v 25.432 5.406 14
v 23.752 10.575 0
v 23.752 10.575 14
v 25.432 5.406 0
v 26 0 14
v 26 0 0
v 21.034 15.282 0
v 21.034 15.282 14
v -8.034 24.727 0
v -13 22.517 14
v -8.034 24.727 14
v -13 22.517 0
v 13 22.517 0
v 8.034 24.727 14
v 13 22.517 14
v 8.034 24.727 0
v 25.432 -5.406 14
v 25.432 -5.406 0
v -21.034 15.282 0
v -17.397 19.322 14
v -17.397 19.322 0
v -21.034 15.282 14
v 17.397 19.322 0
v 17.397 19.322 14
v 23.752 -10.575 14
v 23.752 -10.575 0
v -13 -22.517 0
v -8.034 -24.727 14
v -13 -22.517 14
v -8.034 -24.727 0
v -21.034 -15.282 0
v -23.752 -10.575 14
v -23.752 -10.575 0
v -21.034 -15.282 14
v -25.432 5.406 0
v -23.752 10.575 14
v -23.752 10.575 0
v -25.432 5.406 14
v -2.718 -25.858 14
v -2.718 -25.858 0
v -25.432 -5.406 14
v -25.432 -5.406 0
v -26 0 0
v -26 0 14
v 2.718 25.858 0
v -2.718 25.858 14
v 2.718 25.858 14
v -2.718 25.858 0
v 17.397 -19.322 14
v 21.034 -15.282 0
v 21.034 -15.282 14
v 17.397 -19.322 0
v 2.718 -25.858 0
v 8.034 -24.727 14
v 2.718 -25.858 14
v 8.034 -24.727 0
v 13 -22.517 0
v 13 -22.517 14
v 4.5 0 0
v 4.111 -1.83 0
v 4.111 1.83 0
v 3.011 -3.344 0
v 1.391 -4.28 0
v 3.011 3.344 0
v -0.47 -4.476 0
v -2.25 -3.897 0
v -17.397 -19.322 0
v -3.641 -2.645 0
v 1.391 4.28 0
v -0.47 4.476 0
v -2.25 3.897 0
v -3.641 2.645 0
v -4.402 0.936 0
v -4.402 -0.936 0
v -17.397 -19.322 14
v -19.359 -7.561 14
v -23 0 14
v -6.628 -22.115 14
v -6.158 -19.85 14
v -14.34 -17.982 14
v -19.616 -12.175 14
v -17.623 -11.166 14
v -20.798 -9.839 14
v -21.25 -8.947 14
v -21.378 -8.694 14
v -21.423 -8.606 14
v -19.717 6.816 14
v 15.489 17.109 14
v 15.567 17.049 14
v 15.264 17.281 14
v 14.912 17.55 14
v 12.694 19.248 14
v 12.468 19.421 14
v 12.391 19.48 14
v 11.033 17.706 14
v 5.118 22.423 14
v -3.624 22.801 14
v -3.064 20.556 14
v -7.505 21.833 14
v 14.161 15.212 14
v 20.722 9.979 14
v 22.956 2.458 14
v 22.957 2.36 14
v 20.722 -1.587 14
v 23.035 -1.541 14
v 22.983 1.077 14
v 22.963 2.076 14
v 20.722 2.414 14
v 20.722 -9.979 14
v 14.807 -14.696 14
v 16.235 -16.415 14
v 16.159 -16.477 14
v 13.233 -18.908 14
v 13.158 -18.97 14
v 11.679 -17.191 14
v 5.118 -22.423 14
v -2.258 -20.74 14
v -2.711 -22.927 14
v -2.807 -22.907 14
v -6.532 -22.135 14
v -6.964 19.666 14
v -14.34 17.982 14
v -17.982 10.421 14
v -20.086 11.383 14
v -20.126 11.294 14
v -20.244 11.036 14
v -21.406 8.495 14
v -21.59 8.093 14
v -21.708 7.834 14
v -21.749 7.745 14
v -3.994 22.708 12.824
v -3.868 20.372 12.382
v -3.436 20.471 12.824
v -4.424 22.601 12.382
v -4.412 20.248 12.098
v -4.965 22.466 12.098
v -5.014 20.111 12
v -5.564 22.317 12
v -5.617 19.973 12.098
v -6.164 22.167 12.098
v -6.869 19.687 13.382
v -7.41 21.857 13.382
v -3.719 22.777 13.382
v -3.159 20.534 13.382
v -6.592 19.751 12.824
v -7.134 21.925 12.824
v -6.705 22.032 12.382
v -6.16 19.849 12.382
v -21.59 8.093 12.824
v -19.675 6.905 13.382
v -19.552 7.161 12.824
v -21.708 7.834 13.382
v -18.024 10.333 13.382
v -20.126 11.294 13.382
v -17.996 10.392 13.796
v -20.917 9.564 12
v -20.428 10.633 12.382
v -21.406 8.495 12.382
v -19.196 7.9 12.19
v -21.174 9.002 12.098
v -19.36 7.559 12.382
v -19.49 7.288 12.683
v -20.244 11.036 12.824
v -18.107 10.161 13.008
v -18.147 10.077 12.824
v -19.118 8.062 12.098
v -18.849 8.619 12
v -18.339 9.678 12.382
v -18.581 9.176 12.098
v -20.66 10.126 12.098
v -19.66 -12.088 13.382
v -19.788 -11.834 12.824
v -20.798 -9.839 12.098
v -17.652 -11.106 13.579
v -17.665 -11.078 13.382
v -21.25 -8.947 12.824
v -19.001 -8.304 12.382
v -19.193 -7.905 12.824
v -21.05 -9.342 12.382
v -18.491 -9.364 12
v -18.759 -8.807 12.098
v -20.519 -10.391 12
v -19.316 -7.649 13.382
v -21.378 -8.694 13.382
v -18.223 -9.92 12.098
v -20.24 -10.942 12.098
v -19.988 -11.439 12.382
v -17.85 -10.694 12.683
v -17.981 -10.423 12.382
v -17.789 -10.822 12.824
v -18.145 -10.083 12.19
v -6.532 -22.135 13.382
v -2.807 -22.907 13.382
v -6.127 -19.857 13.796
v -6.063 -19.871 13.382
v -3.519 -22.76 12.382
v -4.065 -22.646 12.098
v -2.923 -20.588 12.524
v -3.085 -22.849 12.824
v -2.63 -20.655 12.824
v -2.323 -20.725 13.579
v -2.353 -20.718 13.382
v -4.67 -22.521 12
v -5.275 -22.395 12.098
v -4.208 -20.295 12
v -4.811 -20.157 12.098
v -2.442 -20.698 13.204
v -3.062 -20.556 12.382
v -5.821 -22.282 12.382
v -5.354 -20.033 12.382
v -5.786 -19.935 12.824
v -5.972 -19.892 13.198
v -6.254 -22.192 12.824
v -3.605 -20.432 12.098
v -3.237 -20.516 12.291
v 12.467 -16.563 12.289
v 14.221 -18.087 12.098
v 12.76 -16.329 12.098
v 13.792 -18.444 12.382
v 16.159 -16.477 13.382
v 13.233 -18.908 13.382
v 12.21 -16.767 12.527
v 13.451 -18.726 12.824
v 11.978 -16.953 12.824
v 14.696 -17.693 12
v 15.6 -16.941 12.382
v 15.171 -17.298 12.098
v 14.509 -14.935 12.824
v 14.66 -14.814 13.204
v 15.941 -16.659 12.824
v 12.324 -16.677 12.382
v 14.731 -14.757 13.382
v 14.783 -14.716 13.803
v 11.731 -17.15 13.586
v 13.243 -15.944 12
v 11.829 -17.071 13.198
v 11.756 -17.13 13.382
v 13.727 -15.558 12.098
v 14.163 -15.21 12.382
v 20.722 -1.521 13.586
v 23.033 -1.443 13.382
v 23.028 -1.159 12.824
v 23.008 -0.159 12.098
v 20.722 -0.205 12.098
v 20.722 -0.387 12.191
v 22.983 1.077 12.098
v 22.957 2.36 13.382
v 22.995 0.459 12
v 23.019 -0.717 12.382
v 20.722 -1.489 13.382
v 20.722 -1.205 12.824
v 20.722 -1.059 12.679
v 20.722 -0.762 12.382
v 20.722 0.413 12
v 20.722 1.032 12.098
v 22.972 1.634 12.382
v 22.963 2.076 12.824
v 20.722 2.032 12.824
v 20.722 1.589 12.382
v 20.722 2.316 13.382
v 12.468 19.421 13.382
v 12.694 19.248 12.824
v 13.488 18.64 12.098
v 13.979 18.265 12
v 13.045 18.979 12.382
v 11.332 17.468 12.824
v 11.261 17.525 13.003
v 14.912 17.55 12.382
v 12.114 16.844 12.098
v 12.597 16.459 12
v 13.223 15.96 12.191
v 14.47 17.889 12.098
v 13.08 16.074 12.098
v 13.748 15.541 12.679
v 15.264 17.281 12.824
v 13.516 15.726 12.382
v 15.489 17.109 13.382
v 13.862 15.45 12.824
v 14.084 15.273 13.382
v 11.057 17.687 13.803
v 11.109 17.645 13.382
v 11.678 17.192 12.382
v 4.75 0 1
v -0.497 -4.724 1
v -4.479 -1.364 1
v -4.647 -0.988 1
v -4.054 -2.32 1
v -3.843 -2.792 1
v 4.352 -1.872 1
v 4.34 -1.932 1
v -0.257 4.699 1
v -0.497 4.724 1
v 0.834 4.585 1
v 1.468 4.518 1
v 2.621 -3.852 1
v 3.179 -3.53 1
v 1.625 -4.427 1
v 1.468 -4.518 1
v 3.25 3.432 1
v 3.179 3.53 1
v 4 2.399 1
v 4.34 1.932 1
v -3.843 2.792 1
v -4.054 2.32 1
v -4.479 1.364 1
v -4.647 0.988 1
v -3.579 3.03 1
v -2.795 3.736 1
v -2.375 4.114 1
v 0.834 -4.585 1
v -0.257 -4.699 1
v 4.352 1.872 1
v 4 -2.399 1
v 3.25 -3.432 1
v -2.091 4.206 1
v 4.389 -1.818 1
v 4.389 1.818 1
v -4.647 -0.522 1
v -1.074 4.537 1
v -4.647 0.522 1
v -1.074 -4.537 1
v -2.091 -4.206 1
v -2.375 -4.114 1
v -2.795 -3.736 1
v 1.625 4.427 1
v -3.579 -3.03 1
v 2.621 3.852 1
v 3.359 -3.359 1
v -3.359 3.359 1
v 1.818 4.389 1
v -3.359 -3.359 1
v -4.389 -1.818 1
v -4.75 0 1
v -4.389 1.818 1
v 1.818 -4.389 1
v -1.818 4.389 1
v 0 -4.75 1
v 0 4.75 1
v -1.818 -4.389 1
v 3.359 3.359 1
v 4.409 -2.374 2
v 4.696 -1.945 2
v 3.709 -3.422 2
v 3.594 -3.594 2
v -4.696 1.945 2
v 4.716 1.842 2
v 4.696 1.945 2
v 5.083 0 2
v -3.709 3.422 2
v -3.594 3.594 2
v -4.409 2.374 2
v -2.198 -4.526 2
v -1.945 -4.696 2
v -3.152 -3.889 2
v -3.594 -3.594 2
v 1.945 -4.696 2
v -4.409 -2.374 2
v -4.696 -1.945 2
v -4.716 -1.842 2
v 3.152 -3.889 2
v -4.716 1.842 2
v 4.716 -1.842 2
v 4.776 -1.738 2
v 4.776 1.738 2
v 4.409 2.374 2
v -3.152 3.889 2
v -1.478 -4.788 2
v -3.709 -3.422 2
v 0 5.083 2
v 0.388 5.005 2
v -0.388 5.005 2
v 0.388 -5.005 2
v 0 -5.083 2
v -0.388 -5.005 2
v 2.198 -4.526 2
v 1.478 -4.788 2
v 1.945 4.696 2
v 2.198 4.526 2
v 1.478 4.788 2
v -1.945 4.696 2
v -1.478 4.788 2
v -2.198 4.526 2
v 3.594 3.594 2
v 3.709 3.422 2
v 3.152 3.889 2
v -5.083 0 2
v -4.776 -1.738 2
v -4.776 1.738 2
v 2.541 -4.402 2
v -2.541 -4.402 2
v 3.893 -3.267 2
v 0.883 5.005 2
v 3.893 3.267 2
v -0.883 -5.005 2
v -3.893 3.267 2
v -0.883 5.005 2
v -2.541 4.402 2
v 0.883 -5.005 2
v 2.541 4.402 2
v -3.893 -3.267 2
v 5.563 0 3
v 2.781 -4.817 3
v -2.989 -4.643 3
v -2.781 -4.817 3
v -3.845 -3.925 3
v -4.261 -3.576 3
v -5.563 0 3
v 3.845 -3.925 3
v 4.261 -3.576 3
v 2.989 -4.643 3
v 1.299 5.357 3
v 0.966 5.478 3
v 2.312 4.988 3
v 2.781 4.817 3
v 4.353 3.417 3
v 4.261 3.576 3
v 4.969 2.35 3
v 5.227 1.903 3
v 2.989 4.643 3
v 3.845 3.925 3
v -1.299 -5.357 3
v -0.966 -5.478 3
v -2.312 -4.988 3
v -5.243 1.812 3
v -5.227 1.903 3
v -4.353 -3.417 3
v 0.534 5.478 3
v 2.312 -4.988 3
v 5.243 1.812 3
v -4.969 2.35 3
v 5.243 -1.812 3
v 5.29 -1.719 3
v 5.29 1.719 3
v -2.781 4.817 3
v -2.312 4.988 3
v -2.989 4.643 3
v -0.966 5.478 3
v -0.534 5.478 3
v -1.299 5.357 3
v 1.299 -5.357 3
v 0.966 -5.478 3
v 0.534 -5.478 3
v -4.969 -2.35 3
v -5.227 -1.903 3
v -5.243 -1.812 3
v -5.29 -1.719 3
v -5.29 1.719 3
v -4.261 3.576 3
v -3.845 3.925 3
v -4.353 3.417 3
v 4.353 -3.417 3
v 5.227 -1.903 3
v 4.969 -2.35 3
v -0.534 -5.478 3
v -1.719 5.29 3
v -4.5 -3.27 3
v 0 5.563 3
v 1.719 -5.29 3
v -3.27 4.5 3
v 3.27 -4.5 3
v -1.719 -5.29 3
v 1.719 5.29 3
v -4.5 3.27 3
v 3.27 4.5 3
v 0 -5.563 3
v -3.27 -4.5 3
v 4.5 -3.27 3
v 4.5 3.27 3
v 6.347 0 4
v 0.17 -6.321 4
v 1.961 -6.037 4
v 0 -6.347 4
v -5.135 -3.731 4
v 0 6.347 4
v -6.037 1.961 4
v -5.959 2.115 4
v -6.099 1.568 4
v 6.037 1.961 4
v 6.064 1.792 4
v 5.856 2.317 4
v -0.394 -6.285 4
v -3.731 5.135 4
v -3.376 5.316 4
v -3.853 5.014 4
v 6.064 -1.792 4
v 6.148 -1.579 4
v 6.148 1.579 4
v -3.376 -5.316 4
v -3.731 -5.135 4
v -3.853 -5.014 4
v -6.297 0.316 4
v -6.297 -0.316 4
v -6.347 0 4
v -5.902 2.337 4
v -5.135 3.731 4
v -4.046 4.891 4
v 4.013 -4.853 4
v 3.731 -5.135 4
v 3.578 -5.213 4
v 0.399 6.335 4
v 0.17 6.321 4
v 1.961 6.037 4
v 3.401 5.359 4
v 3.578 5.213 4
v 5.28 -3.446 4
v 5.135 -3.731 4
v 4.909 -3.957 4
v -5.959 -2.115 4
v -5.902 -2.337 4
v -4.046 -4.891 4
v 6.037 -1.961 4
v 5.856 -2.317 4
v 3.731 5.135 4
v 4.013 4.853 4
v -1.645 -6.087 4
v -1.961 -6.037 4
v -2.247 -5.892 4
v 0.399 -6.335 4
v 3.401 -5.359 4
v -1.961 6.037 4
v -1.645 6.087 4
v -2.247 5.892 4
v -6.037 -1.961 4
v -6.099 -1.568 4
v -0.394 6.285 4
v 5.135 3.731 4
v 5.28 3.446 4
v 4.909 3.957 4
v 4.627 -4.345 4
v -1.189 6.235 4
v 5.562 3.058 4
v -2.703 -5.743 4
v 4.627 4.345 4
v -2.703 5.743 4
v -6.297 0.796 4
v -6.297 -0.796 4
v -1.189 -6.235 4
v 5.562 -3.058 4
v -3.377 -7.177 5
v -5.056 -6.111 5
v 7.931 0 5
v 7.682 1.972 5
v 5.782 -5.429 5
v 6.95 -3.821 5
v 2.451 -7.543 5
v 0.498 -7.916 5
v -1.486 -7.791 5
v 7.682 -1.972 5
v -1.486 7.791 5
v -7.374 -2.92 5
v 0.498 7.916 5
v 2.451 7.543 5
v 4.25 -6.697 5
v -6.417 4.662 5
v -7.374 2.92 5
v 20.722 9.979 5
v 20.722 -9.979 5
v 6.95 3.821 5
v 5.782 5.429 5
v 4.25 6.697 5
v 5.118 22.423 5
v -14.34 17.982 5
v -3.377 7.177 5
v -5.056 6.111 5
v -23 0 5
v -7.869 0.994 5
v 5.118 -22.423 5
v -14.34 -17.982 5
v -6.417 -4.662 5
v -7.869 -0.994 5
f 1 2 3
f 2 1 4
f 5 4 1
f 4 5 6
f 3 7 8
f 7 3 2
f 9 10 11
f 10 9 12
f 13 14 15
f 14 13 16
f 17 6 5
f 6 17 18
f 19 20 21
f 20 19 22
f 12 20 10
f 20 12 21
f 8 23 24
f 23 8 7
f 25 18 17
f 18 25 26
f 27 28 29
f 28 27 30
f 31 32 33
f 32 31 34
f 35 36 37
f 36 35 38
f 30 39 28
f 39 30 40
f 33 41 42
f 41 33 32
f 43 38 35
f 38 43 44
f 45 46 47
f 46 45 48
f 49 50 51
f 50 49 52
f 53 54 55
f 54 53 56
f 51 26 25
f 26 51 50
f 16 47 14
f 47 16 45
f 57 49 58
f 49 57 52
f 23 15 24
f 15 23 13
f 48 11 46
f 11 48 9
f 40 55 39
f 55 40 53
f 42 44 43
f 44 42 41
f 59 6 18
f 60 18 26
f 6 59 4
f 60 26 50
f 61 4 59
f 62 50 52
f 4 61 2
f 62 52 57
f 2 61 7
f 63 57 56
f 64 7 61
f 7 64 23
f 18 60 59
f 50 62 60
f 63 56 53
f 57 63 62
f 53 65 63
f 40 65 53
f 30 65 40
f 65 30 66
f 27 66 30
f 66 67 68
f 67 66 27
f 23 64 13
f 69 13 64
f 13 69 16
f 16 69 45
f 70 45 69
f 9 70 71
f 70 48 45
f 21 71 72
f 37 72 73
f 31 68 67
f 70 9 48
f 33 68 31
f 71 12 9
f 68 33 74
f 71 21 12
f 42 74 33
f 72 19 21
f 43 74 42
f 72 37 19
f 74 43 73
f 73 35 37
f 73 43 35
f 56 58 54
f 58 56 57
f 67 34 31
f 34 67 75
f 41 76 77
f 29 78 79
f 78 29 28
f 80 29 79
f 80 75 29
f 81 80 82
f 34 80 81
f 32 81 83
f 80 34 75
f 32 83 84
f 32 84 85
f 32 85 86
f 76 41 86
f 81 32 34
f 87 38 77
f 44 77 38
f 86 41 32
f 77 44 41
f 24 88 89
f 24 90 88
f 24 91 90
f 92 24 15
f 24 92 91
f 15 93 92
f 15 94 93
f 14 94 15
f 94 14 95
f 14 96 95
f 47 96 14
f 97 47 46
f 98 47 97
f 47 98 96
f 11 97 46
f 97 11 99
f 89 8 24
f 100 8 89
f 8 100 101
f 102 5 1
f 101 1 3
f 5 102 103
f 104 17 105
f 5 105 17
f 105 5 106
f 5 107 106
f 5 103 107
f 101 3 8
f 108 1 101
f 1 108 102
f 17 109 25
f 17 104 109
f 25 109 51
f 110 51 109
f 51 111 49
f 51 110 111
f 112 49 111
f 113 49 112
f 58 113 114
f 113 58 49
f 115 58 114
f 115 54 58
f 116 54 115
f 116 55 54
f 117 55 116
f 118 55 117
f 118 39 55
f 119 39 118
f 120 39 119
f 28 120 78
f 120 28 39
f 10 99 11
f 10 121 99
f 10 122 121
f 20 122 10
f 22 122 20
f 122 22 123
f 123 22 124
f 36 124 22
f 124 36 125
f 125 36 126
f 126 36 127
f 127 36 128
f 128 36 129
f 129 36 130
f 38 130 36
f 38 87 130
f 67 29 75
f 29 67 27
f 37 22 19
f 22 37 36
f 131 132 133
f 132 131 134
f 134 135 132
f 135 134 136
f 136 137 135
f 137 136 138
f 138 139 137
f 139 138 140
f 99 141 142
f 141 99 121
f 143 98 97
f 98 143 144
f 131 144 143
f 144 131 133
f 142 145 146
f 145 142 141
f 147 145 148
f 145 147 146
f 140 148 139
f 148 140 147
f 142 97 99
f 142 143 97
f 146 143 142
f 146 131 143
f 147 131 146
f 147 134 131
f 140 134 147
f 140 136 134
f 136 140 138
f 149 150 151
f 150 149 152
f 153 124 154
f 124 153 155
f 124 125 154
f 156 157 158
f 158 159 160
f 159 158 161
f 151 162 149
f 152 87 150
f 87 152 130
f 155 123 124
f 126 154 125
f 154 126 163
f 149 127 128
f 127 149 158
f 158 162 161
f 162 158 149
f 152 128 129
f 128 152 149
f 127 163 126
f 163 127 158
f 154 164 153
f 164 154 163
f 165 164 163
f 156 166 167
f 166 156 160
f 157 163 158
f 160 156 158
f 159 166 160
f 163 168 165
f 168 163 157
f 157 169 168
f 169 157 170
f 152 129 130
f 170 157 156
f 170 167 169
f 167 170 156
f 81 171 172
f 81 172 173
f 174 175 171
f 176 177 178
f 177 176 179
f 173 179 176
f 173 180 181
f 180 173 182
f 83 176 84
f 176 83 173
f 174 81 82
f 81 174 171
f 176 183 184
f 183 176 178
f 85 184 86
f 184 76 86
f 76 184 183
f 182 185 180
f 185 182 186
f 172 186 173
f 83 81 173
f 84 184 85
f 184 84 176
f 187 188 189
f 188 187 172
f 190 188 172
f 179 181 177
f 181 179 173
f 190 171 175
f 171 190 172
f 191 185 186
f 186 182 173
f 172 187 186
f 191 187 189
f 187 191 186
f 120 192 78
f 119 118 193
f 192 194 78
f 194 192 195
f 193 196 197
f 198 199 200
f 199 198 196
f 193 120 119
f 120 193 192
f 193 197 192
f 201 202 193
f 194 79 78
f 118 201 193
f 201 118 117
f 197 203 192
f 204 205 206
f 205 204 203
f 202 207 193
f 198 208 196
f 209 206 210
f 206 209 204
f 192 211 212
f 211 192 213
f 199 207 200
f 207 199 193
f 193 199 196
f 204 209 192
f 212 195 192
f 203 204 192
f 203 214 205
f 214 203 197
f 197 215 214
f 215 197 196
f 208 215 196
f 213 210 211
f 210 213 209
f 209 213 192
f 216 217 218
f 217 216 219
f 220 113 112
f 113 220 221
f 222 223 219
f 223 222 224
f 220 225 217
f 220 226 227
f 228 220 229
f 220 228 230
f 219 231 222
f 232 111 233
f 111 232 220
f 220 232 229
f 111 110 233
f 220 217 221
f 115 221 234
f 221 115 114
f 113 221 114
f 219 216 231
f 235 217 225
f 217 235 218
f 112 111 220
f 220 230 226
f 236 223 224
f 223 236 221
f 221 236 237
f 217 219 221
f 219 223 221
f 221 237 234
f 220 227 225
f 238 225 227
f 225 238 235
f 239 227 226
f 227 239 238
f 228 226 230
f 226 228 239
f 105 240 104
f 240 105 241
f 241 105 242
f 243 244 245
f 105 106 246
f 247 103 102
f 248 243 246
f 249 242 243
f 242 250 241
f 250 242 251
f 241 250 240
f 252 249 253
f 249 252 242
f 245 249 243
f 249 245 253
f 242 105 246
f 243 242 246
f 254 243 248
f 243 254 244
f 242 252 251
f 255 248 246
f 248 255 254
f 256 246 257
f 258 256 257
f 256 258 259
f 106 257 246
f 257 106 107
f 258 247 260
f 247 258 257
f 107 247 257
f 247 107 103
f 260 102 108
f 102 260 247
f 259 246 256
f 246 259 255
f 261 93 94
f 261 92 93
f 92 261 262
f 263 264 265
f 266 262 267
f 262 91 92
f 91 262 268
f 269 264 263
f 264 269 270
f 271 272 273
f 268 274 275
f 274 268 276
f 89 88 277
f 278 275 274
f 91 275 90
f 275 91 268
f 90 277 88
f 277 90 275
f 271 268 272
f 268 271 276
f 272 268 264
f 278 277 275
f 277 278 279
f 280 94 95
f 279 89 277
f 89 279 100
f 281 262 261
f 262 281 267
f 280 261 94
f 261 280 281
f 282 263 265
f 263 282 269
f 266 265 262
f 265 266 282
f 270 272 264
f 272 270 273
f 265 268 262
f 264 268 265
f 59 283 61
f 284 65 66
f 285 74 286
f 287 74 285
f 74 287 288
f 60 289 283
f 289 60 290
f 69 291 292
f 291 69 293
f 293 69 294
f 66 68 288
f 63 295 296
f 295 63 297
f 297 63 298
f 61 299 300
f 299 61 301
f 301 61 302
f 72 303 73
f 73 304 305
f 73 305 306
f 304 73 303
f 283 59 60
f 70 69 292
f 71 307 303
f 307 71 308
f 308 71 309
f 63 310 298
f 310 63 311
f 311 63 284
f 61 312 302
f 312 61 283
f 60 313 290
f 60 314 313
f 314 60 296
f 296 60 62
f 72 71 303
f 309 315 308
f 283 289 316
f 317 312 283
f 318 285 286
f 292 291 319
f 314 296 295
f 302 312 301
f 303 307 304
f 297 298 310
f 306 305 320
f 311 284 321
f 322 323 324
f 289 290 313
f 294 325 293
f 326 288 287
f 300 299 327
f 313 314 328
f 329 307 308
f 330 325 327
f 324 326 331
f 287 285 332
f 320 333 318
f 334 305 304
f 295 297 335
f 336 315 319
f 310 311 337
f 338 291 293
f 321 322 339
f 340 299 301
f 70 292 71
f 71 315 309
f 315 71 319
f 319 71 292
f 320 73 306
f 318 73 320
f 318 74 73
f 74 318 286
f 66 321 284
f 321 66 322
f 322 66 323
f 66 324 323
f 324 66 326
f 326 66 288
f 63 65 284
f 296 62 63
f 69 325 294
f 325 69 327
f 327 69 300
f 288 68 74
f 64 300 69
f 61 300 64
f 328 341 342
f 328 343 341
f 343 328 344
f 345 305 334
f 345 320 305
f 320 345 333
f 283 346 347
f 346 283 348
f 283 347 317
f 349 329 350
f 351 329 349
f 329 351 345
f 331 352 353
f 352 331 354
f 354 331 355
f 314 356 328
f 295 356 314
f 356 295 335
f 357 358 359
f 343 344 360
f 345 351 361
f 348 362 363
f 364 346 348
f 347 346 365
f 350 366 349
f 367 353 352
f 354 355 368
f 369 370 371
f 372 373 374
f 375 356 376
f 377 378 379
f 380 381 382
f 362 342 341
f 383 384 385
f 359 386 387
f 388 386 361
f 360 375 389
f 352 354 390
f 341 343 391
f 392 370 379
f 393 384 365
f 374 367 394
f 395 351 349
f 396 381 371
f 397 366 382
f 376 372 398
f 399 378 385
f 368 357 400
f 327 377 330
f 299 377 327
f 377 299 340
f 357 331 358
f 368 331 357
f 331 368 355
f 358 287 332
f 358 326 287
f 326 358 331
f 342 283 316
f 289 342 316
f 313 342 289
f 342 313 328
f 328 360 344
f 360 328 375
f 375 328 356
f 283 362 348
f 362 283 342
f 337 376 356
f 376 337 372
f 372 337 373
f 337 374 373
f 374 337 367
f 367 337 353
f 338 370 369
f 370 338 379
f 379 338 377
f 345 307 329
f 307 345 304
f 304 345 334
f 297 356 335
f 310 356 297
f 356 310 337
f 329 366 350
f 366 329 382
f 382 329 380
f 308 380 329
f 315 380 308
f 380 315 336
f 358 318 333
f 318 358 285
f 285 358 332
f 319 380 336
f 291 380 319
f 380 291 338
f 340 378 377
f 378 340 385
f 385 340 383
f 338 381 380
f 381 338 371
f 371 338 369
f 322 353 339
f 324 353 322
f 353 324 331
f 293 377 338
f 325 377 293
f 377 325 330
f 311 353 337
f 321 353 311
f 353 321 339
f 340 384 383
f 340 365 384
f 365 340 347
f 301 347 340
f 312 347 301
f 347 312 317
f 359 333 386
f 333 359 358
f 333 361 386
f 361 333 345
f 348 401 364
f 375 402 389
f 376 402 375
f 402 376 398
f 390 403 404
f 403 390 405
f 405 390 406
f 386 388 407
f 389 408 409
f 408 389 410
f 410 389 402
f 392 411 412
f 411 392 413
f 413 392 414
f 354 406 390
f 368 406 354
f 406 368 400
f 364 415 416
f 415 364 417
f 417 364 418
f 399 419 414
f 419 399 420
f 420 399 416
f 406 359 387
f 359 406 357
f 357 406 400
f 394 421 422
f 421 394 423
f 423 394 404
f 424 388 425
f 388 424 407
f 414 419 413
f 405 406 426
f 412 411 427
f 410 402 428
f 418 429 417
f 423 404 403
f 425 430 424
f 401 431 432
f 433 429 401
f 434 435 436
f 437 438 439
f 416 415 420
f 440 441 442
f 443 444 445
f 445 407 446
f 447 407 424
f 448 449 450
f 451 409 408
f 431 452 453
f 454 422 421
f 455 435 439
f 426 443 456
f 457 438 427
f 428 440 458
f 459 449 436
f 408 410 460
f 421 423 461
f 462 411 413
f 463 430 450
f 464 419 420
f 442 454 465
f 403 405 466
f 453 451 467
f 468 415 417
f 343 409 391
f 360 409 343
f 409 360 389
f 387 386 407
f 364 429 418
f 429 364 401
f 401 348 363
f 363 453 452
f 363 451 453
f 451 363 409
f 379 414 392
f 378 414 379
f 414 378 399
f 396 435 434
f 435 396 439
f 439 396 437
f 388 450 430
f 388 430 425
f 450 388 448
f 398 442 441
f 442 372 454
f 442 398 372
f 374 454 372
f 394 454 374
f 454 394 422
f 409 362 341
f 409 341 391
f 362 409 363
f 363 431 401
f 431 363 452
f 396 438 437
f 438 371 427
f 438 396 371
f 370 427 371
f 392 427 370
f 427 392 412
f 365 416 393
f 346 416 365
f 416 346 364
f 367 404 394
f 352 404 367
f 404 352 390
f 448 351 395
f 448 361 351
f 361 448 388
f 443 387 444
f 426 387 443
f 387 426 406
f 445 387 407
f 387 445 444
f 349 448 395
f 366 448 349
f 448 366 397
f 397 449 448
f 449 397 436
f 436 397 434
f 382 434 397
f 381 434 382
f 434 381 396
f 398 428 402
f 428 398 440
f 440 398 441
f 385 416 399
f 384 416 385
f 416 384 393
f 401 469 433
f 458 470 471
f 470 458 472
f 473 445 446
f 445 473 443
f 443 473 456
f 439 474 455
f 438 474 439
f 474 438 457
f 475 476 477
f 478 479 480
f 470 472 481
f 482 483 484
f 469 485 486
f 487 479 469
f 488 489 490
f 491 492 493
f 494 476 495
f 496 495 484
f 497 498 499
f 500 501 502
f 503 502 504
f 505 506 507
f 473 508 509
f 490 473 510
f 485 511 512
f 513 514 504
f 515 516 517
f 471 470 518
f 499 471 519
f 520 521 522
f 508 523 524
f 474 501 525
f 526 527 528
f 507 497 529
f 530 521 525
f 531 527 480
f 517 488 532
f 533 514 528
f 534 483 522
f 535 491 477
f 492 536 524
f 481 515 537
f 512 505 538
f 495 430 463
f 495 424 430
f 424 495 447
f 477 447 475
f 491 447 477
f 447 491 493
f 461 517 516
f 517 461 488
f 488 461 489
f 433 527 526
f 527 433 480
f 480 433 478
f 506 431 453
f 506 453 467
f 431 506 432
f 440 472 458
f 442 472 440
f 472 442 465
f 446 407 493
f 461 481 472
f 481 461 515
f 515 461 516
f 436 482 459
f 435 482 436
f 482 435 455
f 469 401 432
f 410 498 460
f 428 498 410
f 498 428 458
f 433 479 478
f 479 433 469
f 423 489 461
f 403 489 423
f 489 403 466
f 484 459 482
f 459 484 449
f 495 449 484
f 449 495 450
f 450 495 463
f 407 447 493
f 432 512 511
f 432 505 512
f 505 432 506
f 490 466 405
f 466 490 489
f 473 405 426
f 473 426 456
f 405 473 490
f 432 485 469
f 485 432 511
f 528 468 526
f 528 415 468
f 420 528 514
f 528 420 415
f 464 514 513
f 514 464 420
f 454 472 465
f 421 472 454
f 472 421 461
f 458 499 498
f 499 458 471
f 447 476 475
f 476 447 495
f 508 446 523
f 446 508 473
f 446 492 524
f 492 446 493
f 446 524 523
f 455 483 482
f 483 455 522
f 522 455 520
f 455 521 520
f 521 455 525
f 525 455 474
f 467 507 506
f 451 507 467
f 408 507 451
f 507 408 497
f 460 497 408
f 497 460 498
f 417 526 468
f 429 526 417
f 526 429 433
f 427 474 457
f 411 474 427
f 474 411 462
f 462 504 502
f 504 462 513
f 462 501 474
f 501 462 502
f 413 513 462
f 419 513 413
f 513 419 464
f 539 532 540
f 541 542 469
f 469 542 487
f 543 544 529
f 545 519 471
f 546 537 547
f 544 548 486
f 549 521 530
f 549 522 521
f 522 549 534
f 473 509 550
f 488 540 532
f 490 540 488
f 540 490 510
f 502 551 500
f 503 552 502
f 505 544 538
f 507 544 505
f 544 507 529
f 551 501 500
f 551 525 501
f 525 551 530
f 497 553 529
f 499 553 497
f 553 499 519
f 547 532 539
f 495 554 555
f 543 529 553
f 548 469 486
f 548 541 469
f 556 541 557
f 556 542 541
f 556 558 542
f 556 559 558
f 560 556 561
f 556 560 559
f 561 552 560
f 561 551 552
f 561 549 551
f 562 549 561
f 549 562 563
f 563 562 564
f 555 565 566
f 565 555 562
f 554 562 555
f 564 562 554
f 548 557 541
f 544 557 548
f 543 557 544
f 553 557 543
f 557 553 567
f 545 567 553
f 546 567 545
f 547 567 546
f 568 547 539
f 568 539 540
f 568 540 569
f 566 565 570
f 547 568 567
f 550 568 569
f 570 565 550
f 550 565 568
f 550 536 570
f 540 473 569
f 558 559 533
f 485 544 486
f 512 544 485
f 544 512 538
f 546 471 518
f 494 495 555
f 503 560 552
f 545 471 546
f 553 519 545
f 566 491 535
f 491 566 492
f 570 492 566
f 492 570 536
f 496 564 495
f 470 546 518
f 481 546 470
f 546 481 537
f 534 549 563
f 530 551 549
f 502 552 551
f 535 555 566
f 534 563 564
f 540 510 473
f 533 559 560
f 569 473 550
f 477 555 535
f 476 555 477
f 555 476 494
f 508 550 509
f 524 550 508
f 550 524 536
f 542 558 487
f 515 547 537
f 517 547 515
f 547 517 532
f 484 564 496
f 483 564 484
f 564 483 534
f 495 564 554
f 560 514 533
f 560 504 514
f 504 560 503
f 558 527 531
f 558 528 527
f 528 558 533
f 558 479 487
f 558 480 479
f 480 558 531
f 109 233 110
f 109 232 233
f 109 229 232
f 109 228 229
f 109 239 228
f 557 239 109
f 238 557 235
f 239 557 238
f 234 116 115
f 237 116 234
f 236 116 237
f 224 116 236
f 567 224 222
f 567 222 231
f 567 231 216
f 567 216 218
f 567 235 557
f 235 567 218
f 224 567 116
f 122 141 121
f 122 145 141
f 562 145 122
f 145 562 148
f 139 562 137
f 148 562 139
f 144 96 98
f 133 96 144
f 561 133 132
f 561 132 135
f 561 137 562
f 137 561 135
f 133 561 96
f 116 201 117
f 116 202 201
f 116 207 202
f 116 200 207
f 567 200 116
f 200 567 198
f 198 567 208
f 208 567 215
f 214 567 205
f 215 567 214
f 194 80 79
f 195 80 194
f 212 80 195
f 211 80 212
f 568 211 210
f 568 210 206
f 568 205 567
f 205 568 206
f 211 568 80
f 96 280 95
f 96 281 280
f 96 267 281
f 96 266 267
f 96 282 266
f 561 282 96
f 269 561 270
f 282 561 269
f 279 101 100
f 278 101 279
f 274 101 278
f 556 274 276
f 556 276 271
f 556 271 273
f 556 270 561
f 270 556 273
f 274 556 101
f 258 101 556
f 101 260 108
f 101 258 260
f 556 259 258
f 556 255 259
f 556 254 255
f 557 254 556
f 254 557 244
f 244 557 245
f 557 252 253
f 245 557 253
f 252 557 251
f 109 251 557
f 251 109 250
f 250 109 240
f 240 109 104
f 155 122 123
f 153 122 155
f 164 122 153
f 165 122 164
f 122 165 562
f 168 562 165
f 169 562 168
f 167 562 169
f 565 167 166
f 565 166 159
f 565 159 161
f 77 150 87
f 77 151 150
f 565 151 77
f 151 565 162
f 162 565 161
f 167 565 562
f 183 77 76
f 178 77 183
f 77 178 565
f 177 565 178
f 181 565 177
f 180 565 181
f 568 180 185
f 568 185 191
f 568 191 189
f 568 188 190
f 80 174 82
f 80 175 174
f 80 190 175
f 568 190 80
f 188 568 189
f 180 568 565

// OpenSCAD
use<MCAD/2Dshapes.scad>

numbgears=7;
holerad=23;//should be axle gear rad+some extra. Will take some fiddling to find out exactly how much bigger.
shaftsize=4;//radius obviously...
caserad=holerad+3;//The radius of the outside of the case

basethick=5;//how thick the base is.
height=basethick+9;//How tall one half is.

pinrad=2;//How thick the pins that hold the gears to the body are
pinrot=14;//Edit this manually until the pins line up with the sides. I really should figure out how to do this automatically, or perhaps just rewrite ngon so it uses the same rotation method. For 7 sides it's 15

difference()
{

	union(){
		cylinder(h = height, r=caserad);
		translate([])cylinder();
		}
	translate([0,0,basethick]){
		linear_extrude(height=height)ngon(numbgears,holerad);
	}
	translate([0,0,-1])cylinder(h = basethick+2, r=shaftsize);

	//This creates the holes for all the pins.
	rotate([0,0,pinrot])translate([0,0,height])for ( i = [0 : numbgears] )
	{
	    rotate( i * 360 / numbgears, [0, 0, 1])
	    translate([0, caserad-(caserad-holerad), 0])
	    rotate([90,0,0])cylinder(h = basethick+2, r=pinrad,$fn=20);
	}
for(i=[1:10]){
		translate([0,0,i-6])cylinder(h=1,r1=tan(i*7)+3.6,r2=tan((i+1)*7)+3.6);
	}

}
